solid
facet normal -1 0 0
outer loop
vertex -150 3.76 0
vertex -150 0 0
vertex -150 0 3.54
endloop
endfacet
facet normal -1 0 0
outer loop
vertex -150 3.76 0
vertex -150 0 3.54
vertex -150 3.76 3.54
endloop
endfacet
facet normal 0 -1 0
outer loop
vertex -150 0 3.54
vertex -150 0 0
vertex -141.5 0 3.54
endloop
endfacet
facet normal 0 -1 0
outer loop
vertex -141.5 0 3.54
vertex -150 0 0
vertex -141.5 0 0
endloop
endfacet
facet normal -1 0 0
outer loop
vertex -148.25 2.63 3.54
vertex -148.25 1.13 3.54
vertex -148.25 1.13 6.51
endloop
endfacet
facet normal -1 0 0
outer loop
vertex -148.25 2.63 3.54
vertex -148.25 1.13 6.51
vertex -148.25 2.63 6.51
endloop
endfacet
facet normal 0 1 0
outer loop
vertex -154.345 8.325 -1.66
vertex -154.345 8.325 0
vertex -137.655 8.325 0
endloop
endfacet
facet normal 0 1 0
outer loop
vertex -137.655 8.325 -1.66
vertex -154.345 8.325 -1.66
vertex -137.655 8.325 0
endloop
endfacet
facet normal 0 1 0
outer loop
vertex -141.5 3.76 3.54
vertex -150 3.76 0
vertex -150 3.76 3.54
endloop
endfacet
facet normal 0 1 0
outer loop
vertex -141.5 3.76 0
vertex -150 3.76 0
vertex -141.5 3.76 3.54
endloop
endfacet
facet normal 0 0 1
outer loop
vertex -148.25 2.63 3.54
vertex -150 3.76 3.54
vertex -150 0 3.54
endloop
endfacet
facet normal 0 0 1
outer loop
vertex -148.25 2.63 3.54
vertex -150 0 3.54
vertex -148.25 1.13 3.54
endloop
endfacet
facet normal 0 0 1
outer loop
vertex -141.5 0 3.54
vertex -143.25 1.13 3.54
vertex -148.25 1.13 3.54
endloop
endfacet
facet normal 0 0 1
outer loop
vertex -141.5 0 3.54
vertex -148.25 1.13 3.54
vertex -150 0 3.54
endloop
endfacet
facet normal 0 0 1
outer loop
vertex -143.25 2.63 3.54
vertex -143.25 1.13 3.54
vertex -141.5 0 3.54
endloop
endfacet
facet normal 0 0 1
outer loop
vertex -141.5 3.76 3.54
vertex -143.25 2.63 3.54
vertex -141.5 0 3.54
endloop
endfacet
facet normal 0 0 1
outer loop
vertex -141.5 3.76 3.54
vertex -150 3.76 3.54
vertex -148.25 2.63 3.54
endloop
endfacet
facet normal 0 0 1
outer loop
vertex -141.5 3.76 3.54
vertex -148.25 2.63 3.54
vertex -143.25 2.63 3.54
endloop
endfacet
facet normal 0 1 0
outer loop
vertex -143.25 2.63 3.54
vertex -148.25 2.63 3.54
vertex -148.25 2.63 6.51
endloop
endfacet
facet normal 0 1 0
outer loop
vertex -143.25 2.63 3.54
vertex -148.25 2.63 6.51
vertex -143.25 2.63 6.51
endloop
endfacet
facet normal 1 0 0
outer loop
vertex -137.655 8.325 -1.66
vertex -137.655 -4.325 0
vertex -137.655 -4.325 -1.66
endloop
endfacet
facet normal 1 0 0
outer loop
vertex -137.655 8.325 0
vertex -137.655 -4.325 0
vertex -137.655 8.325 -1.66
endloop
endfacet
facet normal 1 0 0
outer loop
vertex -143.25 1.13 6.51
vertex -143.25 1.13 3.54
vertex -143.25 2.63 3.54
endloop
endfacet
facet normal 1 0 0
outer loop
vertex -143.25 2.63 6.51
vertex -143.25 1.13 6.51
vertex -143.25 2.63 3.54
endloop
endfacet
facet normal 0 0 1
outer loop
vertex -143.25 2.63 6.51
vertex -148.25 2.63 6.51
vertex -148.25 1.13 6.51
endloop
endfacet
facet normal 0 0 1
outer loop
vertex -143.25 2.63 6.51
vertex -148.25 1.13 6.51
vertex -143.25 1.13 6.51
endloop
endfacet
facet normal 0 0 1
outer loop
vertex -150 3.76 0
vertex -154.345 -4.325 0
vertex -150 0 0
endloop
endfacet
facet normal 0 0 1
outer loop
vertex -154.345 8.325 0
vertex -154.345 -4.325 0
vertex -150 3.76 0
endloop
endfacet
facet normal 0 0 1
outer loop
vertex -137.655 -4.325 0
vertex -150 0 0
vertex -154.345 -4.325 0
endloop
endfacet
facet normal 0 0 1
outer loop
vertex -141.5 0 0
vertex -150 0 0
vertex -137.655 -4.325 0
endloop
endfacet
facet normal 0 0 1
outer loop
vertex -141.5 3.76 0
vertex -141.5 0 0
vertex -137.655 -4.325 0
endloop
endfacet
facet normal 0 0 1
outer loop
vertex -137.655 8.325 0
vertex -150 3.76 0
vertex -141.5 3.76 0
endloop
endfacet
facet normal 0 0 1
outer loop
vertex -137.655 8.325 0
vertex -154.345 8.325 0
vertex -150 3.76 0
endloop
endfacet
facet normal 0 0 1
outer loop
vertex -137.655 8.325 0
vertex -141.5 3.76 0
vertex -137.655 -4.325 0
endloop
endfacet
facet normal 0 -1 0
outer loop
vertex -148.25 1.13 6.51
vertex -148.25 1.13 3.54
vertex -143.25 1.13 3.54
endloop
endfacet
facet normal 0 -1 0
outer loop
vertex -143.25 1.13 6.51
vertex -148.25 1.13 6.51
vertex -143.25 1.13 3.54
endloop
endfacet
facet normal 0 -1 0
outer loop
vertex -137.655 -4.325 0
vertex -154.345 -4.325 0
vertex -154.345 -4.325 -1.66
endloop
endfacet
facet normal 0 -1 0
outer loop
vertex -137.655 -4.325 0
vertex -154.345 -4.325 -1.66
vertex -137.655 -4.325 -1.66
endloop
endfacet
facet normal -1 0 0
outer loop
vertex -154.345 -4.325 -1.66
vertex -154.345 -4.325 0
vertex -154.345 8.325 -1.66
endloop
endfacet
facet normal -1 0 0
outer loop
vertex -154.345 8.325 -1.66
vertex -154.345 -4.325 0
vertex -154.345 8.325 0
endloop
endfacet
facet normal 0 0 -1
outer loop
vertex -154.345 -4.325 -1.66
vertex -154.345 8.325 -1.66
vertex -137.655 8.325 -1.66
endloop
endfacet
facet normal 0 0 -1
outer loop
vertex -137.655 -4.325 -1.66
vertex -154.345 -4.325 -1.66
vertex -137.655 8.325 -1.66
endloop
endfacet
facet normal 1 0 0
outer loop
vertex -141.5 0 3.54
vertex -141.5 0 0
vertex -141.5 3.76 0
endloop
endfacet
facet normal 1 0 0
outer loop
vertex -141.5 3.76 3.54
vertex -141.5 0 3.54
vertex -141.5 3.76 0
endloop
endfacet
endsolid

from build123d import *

# Parameters (mm, degrees)
SKETCH013_W      = 8.5
SKETCH013_H      = 3.76
EXTRUDE013_DEPTH = 3.54
SKETCH014_W      = 5
SKETCH014_H      = 1.5
EXTRUDE014_DEPTH = 2.97
SKETCH012_W      = 16.69
SKETCH012_H      = 12.65
EXTRUDE012_DEPTH = 1.66


with BuildPart() as extrude_switch_house:
    # Sketch013 → Extrude013 (new body)
    with BuildSketch(Plane.XY):
        with Locations((4.25, 1.88)):
            Rectangle(SKETCH013_W, SKETCH013_H)
    extrude(amount=EXTRUDE013_DEPTH)


with BuildPart() as extrude_switch:
    # Sketch014 → Extrude014 (new body)
    with BuildSketch(Plane.XY):
        with Locations((4.25, 1.88)):
            Rectangle(SKETCH014_W, SKETCH014_H)
    extrude(amount=EXTRUDE014_DEPTH)


with BuildPart() as extrude_switch_1:
    # Extrude014 placement: moved
    add(extrude_switch.part.moved(Location((0, 0, 3.54))))


with BuildPart() as fusion_switch:
    # Sketch012 → Extrude012 (new body)
    with BuildSketch(Plane(origin=(4, 2, 0), x_dir=(1, 0, 0), z_dir=(0, 0, 1))):
        Rectangle(SKETCH012_W, SKETCH012_H)
    extrude(amount=-EXTRUDE012_DEPTH)

    # Fusion004: union Extrude_Switch_house, Extrude_Switch_
    add(extrude_switch_house.part)
    add(extrude_switch_1.part)


with BuildPart() as fusion_switch_1:
    # Fusion004 placement: moved
    add(fusion_switch.part.moved(Location((-150, 0, 0))))


solid = fusion_switch_1.part
